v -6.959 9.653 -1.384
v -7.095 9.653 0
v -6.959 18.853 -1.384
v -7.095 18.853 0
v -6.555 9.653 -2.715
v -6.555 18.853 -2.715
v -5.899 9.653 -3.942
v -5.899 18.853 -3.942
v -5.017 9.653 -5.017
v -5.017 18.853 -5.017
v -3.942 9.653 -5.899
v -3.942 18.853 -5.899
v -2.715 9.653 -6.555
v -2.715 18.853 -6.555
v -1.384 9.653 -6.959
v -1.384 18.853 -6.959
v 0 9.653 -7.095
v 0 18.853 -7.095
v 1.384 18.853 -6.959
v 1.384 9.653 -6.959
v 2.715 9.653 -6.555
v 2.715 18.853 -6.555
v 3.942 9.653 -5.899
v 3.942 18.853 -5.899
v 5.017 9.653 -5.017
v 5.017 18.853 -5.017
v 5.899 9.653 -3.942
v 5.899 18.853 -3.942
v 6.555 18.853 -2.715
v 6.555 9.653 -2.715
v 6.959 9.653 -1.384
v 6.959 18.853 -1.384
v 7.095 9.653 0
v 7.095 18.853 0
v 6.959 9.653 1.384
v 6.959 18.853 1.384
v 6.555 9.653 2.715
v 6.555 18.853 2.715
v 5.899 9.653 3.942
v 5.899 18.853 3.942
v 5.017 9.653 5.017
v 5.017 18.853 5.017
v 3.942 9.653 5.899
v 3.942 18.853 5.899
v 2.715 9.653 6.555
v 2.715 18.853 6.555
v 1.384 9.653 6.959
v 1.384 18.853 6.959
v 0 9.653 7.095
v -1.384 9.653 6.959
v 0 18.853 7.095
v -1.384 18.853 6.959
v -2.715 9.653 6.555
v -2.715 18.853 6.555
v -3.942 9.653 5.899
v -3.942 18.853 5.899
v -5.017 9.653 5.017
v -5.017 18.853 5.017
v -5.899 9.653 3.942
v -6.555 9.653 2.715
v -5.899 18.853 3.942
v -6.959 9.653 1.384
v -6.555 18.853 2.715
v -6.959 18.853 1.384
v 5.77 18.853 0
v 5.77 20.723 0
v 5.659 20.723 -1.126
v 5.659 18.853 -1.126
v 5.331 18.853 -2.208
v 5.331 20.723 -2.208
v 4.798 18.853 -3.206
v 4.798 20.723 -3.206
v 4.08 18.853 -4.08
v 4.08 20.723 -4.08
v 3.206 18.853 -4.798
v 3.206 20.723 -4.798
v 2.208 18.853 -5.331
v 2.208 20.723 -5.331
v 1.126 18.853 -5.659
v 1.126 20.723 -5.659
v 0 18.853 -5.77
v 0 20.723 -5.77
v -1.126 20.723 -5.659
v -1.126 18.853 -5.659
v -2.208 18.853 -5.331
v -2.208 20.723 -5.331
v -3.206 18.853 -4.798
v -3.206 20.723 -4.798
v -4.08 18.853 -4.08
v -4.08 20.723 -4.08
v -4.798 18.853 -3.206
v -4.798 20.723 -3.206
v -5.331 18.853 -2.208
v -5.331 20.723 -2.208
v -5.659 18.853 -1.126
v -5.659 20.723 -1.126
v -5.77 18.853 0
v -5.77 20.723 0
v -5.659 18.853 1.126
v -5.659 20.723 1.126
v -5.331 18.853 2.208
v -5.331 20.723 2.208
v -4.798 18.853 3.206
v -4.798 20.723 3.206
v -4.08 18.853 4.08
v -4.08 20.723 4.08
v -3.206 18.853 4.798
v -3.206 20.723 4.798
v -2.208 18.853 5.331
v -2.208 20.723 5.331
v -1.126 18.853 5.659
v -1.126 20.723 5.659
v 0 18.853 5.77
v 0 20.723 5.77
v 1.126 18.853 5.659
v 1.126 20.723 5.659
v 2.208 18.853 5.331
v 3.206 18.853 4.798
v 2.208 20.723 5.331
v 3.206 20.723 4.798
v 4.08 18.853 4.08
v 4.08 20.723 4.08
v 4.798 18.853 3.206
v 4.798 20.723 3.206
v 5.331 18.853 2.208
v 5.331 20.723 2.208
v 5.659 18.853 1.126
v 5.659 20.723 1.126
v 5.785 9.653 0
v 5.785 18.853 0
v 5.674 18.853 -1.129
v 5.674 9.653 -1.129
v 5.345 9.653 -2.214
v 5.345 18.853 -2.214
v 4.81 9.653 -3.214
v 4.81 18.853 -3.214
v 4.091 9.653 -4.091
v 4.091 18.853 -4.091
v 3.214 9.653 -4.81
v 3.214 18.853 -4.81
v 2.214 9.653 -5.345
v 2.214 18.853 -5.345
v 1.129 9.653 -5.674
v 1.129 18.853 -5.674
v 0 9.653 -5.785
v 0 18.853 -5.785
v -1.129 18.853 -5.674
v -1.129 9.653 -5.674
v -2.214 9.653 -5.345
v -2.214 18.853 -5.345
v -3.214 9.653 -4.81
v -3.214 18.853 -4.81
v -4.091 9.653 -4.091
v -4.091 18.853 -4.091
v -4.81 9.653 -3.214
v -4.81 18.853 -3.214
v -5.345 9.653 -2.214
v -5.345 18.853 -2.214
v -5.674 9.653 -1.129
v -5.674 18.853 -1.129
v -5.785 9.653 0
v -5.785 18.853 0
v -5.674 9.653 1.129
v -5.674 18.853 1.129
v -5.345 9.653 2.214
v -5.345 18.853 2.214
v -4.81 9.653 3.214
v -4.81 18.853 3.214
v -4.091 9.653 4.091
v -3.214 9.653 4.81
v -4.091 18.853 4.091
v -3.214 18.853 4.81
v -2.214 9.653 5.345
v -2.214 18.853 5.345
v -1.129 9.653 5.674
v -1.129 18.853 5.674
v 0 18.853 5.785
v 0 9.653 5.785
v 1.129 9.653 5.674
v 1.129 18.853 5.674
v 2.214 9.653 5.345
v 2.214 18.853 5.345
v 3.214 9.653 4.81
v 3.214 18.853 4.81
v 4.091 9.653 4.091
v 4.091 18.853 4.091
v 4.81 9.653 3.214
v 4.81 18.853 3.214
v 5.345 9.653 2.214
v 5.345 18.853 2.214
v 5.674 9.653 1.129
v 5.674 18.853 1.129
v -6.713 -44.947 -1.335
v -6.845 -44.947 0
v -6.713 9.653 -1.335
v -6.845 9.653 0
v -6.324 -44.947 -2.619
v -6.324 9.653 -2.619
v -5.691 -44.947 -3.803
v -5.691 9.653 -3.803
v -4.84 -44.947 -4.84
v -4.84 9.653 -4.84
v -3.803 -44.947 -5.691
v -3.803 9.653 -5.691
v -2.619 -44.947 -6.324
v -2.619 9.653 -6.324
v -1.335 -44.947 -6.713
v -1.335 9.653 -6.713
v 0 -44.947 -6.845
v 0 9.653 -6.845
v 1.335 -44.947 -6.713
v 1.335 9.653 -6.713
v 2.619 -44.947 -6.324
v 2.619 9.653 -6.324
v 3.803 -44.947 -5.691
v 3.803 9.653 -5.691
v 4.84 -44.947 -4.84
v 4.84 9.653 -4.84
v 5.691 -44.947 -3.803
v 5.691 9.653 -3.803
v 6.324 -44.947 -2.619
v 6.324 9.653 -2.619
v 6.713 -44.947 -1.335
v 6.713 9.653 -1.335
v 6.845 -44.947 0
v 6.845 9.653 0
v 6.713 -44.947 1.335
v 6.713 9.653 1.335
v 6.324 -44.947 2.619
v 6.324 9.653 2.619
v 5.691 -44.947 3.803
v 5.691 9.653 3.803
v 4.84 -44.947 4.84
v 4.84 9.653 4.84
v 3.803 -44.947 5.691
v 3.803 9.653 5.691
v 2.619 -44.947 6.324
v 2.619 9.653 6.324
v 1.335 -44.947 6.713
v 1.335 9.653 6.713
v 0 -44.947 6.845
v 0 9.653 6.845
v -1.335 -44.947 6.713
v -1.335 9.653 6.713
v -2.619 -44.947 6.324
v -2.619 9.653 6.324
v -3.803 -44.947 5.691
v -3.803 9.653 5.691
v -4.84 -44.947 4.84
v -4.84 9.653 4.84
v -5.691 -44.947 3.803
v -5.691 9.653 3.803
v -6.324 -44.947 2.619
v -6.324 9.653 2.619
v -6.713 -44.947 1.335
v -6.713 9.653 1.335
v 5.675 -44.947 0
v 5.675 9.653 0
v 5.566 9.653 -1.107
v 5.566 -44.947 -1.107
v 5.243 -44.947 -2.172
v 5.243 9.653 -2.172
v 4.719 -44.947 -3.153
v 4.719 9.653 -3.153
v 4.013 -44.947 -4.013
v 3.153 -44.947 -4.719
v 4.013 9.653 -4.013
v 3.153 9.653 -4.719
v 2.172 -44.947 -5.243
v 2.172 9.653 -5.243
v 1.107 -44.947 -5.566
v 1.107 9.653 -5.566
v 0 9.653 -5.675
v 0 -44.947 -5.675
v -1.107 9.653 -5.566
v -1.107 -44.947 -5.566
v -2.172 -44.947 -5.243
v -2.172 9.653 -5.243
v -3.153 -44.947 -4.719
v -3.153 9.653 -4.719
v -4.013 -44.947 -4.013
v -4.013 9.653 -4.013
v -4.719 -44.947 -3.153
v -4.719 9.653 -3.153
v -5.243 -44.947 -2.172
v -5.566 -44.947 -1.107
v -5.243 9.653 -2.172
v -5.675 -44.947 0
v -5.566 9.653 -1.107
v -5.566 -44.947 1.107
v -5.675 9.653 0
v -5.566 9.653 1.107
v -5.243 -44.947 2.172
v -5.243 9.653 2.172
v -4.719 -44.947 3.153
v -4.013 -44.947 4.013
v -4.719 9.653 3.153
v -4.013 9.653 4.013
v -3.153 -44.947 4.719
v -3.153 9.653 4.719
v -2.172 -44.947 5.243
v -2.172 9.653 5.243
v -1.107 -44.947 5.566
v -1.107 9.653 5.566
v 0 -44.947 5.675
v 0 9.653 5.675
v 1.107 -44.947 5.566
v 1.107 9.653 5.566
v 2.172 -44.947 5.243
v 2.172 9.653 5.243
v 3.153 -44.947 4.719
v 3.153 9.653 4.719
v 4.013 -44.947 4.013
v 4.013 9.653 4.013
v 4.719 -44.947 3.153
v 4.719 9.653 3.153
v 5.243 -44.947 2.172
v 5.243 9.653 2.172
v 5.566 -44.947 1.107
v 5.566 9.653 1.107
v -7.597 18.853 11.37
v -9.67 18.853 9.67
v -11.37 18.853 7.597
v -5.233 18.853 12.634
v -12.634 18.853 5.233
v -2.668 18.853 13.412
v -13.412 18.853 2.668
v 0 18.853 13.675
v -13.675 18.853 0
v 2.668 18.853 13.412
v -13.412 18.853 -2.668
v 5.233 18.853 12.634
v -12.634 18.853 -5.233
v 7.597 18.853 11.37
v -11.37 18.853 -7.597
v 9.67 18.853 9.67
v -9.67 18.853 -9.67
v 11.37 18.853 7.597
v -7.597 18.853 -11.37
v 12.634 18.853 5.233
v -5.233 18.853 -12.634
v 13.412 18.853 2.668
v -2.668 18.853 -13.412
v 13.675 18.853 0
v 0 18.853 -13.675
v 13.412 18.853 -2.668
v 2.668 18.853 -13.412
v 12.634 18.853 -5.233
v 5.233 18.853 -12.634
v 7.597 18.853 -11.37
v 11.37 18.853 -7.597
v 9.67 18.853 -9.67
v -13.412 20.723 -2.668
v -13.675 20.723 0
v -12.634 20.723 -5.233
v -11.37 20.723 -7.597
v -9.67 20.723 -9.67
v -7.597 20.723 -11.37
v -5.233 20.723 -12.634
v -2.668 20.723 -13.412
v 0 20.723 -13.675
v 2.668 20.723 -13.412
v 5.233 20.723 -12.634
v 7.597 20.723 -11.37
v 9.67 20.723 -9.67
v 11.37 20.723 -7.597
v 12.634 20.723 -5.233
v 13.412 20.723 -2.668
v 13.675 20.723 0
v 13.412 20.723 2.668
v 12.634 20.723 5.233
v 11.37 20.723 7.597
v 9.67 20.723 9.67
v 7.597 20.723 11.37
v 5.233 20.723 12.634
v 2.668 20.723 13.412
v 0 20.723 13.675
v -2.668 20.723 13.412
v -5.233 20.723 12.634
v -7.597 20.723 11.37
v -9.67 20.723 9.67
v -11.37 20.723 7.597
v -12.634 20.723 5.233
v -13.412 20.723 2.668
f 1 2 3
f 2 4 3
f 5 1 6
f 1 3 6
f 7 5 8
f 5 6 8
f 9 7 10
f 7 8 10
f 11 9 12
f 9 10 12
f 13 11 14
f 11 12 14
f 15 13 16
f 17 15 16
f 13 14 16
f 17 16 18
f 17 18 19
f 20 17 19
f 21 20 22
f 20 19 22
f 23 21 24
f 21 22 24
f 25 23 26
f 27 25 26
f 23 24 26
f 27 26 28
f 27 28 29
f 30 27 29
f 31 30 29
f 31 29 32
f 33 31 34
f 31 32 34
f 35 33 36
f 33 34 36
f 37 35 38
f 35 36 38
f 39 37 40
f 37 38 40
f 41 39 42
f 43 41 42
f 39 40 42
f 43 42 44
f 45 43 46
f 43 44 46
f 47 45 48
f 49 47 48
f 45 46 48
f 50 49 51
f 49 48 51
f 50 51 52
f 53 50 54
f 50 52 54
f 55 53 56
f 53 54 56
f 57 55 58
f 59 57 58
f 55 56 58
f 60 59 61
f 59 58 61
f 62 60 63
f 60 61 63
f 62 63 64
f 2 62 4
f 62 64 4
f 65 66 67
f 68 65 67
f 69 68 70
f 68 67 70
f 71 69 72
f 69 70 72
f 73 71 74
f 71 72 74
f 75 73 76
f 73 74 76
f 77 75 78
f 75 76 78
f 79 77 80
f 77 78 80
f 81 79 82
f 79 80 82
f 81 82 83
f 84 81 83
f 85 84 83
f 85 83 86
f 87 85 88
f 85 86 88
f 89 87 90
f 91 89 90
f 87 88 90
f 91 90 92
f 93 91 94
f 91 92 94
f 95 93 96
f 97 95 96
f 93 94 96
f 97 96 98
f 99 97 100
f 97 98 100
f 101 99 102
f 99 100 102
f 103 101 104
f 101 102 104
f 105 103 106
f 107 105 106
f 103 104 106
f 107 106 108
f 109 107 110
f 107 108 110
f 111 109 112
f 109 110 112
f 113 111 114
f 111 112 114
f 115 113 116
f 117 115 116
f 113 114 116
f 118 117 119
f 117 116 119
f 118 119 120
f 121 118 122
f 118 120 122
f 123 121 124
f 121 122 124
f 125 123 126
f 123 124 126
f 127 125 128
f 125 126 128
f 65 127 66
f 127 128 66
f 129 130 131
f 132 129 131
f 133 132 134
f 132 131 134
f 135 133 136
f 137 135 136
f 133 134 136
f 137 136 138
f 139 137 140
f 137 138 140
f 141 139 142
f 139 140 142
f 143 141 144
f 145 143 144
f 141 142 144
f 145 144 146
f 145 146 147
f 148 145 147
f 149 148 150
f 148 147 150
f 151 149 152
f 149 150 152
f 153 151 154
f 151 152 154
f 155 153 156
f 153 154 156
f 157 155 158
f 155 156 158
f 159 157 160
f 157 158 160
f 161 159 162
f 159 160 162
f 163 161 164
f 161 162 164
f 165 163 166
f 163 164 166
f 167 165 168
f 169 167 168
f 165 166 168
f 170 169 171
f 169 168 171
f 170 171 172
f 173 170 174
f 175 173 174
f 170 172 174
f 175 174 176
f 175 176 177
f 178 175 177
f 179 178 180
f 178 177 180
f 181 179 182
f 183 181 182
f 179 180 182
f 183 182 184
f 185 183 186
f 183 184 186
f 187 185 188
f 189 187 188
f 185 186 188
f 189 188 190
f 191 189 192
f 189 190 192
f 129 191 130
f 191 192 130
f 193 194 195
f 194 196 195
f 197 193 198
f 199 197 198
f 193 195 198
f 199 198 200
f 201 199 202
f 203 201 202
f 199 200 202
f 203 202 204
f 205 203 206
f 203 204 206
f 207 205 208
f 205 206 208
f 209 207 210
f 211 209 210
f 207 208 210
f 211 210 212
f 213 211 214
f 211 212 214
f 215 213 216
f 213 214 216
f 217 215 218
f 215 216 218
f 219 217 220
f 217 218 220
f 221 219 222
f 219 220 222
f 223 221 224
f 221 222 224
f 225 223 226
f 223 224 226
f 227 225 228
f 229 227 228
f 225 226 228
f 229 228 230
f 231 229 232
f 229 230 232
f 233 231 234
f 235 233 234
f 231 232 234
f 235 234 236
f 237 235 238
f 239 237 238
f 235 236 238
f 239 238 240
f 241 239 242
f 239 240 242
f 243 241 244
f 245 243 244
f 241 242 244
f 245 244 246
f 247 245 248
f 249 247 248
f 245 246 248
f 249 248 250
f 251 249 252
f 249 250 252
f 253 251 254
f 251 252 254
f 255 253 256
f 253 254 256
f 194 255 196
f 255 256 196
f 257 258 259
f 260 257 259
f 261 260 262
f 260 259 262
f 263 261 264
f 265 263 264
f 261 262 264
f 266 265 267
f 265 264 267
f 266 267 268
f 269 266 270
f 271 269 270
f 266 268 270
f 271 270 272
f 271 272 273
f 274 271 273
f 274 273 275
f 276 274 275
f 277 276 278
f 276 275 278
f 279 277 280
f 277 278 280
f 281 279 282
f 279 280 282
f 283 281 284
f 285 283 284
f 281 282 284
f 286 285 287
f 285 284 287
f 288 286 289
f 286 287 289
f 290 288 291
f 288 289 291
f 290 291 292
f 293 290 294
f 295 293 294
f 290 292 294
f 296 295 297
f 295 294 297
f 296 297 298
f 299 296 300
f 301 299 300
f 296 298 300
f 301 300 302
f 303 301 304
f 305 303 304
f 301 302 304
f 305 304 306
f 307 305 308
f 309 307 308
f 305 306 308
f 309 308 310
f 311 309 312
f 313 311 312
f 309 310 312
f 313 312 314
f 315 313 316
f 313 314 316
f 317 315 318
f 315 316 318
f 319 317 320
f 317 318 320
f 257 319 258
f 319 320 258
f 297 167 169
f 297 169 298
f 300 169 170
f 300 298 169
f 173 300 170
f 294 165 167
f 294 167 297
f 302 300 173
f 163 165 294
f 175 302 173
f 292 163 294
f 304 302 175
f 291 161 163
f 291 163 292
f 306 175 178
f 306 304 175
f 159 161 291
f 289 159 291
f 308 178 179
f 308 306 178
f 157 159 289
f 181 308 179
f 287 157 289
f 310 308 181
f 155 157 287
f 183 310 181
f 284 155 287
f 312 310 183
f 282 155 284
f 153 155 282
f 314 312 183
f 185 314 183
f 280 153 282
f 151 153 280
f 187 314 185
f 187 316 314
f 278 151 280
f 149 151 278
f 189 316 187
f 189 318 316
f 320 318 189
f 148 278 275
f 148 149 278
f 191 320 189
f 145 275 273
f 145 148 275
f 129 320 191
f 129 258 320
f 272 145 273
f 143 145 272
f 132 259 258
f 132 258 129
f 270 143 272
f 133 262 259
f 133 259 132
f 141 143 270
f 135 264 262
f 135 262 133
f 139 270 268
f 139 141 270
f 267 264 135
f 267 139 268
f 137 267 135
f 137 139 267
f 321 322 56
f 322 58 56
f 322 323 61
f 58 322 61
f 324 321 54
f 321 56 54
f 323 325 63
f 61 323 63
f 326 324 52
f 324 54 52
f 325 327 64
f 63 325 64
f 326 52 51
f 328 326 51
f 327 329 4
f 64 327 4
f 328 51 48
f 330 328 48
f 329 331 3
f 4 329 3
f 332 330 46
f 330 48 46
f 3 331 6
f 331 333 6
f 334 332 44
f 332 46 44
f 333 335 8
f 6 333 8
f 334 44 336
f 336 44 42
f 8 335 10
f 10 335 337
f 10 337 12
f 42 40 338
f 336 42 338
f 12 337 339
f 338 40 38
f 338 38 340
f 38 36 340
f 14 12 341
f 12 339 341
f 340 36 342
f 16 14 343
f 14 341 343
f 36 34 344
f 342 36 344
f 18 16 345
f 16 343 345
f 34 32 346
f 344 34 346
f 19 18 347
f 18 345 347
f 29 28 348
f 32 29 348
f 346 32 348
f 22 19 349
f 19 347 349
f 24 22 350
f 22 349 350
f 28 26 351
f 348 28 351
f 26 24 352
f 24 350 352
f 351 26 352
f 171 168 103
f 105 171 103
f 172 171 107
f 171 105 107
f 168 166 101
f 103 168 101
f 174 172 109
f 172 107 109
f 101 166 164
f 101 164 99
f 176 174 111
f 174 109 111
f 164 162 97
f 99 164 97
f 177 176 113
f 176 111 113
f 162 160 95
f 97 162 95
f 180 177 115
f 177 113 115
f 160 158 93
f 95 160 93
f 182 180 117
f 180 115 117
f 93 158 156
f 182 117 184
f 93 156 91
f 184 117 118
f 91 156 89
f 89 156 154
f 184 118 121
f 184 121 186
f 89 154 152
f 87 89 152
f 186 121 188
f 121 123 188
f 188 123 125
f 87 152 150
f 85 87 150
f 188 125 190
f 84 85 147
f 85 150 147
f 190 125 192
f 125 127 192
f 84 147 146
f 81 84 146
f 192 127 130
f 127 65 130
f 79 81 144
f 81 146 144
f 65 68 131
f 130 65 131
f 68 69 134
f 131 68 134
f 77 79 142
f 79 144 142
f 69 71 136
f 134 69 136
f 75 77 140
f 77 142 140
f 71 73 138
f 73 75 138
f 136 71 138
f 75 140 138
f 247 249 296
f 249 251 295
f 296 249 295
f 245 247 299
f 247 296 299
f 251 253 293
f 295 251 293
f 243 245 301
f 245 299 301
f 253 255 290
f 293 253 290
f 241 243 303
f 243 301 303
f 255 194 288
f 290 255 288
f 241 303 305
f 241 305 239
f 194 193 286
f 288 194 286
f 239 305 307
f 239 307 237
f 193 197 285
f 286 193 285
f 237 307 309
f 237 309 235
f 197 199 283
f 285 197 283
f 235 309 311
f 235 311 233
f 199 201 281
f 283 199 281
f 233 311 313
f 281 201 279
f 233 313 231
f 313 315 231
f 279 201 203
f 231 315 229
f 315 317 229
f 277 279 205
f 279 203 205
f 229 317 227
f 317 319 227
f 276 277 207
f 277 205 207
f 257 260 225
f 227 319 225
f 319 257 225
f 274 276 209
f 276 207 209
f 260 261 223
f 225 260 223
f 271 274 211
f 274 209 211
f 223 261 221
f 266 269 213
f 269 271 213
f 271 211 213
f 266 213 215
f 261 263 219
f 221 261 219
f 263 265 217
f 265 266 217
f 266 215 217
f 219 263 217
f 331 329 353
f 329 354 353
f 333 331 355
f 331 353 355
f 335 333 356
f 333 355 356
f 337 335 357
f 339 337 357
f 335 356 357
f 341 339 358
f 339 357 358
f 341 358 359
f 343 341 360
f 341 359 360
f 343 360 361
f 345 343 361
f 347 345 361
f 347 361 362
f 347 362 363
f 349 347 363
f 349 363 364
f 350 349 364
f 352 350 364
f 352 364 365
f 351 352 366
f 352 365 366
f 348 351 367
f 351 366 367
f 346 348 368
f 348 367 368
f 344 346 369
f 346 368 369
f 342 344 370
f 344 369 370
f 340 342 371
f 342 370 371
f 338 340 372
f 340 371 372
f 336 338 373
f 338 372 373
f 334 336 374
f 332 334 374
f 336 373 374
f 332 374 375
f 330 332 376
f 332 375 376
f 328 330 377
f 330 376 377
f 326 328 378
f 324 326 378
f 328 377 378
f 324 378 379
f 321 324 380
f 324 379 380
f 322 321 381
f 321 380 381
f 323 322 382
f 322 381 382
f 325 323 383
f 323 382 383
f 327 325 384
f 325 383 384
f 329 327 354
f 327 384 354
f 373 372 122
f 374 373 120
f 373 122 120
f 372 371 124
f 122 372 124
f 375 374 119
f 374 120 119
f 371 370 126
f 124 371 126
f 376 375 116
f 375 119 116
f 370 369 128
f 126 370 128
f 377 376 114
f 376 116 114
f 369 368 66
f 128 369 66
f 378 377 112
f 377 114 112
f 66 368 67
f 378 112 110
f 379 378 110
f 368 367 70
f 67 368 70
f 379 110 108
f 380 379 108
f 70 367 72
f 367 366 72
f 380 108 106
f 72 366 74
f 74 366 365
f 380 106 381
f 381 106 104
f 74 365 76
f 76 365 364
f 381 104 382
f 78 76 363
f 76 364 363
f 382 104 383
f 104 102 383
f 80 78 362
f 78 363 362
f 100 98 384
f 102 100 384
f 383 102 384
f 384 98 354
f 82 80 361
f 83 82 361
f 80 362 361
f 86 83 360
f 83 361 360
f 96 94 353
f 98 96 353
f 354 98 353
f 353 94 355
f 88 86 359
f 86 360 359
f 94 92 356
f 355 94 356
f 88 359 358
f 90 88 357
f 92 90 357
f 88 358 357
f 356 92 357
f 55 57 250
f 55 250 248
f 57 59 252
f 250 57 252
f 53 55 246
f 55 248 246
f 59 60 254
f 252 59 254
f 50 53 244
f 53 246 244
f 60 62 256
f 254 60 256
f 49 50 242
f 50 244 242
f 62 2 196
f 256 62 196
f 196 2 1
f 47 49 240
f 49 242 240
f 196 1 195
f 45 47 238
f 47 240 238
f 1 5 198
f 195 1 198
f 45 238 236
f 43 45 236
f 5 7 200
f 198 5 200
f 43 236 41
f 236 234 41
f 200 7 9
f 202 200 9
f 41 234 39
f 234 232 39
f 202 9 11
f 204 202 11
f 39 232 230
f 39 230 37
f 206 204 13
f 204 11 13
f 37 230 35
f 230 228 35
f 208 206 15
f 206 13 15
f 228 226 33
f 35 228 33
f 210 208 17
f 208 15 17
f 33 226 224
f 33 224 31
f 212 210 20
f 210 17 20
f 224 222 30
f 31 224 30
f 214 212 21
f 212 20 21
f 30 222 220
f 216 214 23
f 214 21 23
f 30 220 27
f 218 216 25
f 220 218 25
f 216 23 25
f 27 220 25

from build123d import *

# Parameters (mm, degrees)
SKETCH2_R          = 5.77
CUT_EXTRUDE1_DEPTH = 1.87
SKETCH3_R          = 5.785
CUT_EXTRUDE2_DEPTH = 9.2
SKETCH4_R          = 5.675
CUT_EXTRUDE3_DEPTH = 54.6


with BuildPart() as part:
    # Sketch1 → Revolve1 (revolve)
    with BuildSketch(Plane.XY):
        Polygon((0, 20.722884615), (0, -44.947115385), (-6.845, -44.947115385), (-6.845, 9.652884615), (-7.095, 9.652884615), (-7.095, 18.852884615), (-13.675, 18.852884615), (-13.675, 20.722884615), align=None)
    revolve(axis=Axis((0, 20.722884615, 0), (0, -1, 0)))

    # Sketch2 → Cut-Extrude1 (cut)
    with BuildSketch(Plane(origin=(0, 20.722884615, 0), x_dir=(1, 0, 0), z_dir=(0, 1, 0))):
        Circle(SKETCH2_R)
    extrude(amount=-CUT_EXTRUDE1_DEPTH, mode=Mode.SUBTRACT)

    # Sketch3 → Cut-Extrude2 (cut)
    with BuildSketch(Plane(origin=(0, 18.852884615, 0), x_dir=(1, 0, 0), z_dir=(0, 1, 0))):
        Circle(SKETCH3_R)
    extrude(amount=-CUT_EXTRUDE2_DEPTH, mode=Mode.SUBTRACT)

    # Sketch4 → Cut-Extrude3 (cut)
    with BuildSketch(Plane(origin=(0, 9.652884615, 0), x_dir=(1, 0, 0), z_dir=(0, 1, 0))):
        Circle(SKETCH4_R)
    extrude(amount=-CUT_EXTRUDE3_DEPTH, mode=Mode.SUBTRACT)


solid = part.part
